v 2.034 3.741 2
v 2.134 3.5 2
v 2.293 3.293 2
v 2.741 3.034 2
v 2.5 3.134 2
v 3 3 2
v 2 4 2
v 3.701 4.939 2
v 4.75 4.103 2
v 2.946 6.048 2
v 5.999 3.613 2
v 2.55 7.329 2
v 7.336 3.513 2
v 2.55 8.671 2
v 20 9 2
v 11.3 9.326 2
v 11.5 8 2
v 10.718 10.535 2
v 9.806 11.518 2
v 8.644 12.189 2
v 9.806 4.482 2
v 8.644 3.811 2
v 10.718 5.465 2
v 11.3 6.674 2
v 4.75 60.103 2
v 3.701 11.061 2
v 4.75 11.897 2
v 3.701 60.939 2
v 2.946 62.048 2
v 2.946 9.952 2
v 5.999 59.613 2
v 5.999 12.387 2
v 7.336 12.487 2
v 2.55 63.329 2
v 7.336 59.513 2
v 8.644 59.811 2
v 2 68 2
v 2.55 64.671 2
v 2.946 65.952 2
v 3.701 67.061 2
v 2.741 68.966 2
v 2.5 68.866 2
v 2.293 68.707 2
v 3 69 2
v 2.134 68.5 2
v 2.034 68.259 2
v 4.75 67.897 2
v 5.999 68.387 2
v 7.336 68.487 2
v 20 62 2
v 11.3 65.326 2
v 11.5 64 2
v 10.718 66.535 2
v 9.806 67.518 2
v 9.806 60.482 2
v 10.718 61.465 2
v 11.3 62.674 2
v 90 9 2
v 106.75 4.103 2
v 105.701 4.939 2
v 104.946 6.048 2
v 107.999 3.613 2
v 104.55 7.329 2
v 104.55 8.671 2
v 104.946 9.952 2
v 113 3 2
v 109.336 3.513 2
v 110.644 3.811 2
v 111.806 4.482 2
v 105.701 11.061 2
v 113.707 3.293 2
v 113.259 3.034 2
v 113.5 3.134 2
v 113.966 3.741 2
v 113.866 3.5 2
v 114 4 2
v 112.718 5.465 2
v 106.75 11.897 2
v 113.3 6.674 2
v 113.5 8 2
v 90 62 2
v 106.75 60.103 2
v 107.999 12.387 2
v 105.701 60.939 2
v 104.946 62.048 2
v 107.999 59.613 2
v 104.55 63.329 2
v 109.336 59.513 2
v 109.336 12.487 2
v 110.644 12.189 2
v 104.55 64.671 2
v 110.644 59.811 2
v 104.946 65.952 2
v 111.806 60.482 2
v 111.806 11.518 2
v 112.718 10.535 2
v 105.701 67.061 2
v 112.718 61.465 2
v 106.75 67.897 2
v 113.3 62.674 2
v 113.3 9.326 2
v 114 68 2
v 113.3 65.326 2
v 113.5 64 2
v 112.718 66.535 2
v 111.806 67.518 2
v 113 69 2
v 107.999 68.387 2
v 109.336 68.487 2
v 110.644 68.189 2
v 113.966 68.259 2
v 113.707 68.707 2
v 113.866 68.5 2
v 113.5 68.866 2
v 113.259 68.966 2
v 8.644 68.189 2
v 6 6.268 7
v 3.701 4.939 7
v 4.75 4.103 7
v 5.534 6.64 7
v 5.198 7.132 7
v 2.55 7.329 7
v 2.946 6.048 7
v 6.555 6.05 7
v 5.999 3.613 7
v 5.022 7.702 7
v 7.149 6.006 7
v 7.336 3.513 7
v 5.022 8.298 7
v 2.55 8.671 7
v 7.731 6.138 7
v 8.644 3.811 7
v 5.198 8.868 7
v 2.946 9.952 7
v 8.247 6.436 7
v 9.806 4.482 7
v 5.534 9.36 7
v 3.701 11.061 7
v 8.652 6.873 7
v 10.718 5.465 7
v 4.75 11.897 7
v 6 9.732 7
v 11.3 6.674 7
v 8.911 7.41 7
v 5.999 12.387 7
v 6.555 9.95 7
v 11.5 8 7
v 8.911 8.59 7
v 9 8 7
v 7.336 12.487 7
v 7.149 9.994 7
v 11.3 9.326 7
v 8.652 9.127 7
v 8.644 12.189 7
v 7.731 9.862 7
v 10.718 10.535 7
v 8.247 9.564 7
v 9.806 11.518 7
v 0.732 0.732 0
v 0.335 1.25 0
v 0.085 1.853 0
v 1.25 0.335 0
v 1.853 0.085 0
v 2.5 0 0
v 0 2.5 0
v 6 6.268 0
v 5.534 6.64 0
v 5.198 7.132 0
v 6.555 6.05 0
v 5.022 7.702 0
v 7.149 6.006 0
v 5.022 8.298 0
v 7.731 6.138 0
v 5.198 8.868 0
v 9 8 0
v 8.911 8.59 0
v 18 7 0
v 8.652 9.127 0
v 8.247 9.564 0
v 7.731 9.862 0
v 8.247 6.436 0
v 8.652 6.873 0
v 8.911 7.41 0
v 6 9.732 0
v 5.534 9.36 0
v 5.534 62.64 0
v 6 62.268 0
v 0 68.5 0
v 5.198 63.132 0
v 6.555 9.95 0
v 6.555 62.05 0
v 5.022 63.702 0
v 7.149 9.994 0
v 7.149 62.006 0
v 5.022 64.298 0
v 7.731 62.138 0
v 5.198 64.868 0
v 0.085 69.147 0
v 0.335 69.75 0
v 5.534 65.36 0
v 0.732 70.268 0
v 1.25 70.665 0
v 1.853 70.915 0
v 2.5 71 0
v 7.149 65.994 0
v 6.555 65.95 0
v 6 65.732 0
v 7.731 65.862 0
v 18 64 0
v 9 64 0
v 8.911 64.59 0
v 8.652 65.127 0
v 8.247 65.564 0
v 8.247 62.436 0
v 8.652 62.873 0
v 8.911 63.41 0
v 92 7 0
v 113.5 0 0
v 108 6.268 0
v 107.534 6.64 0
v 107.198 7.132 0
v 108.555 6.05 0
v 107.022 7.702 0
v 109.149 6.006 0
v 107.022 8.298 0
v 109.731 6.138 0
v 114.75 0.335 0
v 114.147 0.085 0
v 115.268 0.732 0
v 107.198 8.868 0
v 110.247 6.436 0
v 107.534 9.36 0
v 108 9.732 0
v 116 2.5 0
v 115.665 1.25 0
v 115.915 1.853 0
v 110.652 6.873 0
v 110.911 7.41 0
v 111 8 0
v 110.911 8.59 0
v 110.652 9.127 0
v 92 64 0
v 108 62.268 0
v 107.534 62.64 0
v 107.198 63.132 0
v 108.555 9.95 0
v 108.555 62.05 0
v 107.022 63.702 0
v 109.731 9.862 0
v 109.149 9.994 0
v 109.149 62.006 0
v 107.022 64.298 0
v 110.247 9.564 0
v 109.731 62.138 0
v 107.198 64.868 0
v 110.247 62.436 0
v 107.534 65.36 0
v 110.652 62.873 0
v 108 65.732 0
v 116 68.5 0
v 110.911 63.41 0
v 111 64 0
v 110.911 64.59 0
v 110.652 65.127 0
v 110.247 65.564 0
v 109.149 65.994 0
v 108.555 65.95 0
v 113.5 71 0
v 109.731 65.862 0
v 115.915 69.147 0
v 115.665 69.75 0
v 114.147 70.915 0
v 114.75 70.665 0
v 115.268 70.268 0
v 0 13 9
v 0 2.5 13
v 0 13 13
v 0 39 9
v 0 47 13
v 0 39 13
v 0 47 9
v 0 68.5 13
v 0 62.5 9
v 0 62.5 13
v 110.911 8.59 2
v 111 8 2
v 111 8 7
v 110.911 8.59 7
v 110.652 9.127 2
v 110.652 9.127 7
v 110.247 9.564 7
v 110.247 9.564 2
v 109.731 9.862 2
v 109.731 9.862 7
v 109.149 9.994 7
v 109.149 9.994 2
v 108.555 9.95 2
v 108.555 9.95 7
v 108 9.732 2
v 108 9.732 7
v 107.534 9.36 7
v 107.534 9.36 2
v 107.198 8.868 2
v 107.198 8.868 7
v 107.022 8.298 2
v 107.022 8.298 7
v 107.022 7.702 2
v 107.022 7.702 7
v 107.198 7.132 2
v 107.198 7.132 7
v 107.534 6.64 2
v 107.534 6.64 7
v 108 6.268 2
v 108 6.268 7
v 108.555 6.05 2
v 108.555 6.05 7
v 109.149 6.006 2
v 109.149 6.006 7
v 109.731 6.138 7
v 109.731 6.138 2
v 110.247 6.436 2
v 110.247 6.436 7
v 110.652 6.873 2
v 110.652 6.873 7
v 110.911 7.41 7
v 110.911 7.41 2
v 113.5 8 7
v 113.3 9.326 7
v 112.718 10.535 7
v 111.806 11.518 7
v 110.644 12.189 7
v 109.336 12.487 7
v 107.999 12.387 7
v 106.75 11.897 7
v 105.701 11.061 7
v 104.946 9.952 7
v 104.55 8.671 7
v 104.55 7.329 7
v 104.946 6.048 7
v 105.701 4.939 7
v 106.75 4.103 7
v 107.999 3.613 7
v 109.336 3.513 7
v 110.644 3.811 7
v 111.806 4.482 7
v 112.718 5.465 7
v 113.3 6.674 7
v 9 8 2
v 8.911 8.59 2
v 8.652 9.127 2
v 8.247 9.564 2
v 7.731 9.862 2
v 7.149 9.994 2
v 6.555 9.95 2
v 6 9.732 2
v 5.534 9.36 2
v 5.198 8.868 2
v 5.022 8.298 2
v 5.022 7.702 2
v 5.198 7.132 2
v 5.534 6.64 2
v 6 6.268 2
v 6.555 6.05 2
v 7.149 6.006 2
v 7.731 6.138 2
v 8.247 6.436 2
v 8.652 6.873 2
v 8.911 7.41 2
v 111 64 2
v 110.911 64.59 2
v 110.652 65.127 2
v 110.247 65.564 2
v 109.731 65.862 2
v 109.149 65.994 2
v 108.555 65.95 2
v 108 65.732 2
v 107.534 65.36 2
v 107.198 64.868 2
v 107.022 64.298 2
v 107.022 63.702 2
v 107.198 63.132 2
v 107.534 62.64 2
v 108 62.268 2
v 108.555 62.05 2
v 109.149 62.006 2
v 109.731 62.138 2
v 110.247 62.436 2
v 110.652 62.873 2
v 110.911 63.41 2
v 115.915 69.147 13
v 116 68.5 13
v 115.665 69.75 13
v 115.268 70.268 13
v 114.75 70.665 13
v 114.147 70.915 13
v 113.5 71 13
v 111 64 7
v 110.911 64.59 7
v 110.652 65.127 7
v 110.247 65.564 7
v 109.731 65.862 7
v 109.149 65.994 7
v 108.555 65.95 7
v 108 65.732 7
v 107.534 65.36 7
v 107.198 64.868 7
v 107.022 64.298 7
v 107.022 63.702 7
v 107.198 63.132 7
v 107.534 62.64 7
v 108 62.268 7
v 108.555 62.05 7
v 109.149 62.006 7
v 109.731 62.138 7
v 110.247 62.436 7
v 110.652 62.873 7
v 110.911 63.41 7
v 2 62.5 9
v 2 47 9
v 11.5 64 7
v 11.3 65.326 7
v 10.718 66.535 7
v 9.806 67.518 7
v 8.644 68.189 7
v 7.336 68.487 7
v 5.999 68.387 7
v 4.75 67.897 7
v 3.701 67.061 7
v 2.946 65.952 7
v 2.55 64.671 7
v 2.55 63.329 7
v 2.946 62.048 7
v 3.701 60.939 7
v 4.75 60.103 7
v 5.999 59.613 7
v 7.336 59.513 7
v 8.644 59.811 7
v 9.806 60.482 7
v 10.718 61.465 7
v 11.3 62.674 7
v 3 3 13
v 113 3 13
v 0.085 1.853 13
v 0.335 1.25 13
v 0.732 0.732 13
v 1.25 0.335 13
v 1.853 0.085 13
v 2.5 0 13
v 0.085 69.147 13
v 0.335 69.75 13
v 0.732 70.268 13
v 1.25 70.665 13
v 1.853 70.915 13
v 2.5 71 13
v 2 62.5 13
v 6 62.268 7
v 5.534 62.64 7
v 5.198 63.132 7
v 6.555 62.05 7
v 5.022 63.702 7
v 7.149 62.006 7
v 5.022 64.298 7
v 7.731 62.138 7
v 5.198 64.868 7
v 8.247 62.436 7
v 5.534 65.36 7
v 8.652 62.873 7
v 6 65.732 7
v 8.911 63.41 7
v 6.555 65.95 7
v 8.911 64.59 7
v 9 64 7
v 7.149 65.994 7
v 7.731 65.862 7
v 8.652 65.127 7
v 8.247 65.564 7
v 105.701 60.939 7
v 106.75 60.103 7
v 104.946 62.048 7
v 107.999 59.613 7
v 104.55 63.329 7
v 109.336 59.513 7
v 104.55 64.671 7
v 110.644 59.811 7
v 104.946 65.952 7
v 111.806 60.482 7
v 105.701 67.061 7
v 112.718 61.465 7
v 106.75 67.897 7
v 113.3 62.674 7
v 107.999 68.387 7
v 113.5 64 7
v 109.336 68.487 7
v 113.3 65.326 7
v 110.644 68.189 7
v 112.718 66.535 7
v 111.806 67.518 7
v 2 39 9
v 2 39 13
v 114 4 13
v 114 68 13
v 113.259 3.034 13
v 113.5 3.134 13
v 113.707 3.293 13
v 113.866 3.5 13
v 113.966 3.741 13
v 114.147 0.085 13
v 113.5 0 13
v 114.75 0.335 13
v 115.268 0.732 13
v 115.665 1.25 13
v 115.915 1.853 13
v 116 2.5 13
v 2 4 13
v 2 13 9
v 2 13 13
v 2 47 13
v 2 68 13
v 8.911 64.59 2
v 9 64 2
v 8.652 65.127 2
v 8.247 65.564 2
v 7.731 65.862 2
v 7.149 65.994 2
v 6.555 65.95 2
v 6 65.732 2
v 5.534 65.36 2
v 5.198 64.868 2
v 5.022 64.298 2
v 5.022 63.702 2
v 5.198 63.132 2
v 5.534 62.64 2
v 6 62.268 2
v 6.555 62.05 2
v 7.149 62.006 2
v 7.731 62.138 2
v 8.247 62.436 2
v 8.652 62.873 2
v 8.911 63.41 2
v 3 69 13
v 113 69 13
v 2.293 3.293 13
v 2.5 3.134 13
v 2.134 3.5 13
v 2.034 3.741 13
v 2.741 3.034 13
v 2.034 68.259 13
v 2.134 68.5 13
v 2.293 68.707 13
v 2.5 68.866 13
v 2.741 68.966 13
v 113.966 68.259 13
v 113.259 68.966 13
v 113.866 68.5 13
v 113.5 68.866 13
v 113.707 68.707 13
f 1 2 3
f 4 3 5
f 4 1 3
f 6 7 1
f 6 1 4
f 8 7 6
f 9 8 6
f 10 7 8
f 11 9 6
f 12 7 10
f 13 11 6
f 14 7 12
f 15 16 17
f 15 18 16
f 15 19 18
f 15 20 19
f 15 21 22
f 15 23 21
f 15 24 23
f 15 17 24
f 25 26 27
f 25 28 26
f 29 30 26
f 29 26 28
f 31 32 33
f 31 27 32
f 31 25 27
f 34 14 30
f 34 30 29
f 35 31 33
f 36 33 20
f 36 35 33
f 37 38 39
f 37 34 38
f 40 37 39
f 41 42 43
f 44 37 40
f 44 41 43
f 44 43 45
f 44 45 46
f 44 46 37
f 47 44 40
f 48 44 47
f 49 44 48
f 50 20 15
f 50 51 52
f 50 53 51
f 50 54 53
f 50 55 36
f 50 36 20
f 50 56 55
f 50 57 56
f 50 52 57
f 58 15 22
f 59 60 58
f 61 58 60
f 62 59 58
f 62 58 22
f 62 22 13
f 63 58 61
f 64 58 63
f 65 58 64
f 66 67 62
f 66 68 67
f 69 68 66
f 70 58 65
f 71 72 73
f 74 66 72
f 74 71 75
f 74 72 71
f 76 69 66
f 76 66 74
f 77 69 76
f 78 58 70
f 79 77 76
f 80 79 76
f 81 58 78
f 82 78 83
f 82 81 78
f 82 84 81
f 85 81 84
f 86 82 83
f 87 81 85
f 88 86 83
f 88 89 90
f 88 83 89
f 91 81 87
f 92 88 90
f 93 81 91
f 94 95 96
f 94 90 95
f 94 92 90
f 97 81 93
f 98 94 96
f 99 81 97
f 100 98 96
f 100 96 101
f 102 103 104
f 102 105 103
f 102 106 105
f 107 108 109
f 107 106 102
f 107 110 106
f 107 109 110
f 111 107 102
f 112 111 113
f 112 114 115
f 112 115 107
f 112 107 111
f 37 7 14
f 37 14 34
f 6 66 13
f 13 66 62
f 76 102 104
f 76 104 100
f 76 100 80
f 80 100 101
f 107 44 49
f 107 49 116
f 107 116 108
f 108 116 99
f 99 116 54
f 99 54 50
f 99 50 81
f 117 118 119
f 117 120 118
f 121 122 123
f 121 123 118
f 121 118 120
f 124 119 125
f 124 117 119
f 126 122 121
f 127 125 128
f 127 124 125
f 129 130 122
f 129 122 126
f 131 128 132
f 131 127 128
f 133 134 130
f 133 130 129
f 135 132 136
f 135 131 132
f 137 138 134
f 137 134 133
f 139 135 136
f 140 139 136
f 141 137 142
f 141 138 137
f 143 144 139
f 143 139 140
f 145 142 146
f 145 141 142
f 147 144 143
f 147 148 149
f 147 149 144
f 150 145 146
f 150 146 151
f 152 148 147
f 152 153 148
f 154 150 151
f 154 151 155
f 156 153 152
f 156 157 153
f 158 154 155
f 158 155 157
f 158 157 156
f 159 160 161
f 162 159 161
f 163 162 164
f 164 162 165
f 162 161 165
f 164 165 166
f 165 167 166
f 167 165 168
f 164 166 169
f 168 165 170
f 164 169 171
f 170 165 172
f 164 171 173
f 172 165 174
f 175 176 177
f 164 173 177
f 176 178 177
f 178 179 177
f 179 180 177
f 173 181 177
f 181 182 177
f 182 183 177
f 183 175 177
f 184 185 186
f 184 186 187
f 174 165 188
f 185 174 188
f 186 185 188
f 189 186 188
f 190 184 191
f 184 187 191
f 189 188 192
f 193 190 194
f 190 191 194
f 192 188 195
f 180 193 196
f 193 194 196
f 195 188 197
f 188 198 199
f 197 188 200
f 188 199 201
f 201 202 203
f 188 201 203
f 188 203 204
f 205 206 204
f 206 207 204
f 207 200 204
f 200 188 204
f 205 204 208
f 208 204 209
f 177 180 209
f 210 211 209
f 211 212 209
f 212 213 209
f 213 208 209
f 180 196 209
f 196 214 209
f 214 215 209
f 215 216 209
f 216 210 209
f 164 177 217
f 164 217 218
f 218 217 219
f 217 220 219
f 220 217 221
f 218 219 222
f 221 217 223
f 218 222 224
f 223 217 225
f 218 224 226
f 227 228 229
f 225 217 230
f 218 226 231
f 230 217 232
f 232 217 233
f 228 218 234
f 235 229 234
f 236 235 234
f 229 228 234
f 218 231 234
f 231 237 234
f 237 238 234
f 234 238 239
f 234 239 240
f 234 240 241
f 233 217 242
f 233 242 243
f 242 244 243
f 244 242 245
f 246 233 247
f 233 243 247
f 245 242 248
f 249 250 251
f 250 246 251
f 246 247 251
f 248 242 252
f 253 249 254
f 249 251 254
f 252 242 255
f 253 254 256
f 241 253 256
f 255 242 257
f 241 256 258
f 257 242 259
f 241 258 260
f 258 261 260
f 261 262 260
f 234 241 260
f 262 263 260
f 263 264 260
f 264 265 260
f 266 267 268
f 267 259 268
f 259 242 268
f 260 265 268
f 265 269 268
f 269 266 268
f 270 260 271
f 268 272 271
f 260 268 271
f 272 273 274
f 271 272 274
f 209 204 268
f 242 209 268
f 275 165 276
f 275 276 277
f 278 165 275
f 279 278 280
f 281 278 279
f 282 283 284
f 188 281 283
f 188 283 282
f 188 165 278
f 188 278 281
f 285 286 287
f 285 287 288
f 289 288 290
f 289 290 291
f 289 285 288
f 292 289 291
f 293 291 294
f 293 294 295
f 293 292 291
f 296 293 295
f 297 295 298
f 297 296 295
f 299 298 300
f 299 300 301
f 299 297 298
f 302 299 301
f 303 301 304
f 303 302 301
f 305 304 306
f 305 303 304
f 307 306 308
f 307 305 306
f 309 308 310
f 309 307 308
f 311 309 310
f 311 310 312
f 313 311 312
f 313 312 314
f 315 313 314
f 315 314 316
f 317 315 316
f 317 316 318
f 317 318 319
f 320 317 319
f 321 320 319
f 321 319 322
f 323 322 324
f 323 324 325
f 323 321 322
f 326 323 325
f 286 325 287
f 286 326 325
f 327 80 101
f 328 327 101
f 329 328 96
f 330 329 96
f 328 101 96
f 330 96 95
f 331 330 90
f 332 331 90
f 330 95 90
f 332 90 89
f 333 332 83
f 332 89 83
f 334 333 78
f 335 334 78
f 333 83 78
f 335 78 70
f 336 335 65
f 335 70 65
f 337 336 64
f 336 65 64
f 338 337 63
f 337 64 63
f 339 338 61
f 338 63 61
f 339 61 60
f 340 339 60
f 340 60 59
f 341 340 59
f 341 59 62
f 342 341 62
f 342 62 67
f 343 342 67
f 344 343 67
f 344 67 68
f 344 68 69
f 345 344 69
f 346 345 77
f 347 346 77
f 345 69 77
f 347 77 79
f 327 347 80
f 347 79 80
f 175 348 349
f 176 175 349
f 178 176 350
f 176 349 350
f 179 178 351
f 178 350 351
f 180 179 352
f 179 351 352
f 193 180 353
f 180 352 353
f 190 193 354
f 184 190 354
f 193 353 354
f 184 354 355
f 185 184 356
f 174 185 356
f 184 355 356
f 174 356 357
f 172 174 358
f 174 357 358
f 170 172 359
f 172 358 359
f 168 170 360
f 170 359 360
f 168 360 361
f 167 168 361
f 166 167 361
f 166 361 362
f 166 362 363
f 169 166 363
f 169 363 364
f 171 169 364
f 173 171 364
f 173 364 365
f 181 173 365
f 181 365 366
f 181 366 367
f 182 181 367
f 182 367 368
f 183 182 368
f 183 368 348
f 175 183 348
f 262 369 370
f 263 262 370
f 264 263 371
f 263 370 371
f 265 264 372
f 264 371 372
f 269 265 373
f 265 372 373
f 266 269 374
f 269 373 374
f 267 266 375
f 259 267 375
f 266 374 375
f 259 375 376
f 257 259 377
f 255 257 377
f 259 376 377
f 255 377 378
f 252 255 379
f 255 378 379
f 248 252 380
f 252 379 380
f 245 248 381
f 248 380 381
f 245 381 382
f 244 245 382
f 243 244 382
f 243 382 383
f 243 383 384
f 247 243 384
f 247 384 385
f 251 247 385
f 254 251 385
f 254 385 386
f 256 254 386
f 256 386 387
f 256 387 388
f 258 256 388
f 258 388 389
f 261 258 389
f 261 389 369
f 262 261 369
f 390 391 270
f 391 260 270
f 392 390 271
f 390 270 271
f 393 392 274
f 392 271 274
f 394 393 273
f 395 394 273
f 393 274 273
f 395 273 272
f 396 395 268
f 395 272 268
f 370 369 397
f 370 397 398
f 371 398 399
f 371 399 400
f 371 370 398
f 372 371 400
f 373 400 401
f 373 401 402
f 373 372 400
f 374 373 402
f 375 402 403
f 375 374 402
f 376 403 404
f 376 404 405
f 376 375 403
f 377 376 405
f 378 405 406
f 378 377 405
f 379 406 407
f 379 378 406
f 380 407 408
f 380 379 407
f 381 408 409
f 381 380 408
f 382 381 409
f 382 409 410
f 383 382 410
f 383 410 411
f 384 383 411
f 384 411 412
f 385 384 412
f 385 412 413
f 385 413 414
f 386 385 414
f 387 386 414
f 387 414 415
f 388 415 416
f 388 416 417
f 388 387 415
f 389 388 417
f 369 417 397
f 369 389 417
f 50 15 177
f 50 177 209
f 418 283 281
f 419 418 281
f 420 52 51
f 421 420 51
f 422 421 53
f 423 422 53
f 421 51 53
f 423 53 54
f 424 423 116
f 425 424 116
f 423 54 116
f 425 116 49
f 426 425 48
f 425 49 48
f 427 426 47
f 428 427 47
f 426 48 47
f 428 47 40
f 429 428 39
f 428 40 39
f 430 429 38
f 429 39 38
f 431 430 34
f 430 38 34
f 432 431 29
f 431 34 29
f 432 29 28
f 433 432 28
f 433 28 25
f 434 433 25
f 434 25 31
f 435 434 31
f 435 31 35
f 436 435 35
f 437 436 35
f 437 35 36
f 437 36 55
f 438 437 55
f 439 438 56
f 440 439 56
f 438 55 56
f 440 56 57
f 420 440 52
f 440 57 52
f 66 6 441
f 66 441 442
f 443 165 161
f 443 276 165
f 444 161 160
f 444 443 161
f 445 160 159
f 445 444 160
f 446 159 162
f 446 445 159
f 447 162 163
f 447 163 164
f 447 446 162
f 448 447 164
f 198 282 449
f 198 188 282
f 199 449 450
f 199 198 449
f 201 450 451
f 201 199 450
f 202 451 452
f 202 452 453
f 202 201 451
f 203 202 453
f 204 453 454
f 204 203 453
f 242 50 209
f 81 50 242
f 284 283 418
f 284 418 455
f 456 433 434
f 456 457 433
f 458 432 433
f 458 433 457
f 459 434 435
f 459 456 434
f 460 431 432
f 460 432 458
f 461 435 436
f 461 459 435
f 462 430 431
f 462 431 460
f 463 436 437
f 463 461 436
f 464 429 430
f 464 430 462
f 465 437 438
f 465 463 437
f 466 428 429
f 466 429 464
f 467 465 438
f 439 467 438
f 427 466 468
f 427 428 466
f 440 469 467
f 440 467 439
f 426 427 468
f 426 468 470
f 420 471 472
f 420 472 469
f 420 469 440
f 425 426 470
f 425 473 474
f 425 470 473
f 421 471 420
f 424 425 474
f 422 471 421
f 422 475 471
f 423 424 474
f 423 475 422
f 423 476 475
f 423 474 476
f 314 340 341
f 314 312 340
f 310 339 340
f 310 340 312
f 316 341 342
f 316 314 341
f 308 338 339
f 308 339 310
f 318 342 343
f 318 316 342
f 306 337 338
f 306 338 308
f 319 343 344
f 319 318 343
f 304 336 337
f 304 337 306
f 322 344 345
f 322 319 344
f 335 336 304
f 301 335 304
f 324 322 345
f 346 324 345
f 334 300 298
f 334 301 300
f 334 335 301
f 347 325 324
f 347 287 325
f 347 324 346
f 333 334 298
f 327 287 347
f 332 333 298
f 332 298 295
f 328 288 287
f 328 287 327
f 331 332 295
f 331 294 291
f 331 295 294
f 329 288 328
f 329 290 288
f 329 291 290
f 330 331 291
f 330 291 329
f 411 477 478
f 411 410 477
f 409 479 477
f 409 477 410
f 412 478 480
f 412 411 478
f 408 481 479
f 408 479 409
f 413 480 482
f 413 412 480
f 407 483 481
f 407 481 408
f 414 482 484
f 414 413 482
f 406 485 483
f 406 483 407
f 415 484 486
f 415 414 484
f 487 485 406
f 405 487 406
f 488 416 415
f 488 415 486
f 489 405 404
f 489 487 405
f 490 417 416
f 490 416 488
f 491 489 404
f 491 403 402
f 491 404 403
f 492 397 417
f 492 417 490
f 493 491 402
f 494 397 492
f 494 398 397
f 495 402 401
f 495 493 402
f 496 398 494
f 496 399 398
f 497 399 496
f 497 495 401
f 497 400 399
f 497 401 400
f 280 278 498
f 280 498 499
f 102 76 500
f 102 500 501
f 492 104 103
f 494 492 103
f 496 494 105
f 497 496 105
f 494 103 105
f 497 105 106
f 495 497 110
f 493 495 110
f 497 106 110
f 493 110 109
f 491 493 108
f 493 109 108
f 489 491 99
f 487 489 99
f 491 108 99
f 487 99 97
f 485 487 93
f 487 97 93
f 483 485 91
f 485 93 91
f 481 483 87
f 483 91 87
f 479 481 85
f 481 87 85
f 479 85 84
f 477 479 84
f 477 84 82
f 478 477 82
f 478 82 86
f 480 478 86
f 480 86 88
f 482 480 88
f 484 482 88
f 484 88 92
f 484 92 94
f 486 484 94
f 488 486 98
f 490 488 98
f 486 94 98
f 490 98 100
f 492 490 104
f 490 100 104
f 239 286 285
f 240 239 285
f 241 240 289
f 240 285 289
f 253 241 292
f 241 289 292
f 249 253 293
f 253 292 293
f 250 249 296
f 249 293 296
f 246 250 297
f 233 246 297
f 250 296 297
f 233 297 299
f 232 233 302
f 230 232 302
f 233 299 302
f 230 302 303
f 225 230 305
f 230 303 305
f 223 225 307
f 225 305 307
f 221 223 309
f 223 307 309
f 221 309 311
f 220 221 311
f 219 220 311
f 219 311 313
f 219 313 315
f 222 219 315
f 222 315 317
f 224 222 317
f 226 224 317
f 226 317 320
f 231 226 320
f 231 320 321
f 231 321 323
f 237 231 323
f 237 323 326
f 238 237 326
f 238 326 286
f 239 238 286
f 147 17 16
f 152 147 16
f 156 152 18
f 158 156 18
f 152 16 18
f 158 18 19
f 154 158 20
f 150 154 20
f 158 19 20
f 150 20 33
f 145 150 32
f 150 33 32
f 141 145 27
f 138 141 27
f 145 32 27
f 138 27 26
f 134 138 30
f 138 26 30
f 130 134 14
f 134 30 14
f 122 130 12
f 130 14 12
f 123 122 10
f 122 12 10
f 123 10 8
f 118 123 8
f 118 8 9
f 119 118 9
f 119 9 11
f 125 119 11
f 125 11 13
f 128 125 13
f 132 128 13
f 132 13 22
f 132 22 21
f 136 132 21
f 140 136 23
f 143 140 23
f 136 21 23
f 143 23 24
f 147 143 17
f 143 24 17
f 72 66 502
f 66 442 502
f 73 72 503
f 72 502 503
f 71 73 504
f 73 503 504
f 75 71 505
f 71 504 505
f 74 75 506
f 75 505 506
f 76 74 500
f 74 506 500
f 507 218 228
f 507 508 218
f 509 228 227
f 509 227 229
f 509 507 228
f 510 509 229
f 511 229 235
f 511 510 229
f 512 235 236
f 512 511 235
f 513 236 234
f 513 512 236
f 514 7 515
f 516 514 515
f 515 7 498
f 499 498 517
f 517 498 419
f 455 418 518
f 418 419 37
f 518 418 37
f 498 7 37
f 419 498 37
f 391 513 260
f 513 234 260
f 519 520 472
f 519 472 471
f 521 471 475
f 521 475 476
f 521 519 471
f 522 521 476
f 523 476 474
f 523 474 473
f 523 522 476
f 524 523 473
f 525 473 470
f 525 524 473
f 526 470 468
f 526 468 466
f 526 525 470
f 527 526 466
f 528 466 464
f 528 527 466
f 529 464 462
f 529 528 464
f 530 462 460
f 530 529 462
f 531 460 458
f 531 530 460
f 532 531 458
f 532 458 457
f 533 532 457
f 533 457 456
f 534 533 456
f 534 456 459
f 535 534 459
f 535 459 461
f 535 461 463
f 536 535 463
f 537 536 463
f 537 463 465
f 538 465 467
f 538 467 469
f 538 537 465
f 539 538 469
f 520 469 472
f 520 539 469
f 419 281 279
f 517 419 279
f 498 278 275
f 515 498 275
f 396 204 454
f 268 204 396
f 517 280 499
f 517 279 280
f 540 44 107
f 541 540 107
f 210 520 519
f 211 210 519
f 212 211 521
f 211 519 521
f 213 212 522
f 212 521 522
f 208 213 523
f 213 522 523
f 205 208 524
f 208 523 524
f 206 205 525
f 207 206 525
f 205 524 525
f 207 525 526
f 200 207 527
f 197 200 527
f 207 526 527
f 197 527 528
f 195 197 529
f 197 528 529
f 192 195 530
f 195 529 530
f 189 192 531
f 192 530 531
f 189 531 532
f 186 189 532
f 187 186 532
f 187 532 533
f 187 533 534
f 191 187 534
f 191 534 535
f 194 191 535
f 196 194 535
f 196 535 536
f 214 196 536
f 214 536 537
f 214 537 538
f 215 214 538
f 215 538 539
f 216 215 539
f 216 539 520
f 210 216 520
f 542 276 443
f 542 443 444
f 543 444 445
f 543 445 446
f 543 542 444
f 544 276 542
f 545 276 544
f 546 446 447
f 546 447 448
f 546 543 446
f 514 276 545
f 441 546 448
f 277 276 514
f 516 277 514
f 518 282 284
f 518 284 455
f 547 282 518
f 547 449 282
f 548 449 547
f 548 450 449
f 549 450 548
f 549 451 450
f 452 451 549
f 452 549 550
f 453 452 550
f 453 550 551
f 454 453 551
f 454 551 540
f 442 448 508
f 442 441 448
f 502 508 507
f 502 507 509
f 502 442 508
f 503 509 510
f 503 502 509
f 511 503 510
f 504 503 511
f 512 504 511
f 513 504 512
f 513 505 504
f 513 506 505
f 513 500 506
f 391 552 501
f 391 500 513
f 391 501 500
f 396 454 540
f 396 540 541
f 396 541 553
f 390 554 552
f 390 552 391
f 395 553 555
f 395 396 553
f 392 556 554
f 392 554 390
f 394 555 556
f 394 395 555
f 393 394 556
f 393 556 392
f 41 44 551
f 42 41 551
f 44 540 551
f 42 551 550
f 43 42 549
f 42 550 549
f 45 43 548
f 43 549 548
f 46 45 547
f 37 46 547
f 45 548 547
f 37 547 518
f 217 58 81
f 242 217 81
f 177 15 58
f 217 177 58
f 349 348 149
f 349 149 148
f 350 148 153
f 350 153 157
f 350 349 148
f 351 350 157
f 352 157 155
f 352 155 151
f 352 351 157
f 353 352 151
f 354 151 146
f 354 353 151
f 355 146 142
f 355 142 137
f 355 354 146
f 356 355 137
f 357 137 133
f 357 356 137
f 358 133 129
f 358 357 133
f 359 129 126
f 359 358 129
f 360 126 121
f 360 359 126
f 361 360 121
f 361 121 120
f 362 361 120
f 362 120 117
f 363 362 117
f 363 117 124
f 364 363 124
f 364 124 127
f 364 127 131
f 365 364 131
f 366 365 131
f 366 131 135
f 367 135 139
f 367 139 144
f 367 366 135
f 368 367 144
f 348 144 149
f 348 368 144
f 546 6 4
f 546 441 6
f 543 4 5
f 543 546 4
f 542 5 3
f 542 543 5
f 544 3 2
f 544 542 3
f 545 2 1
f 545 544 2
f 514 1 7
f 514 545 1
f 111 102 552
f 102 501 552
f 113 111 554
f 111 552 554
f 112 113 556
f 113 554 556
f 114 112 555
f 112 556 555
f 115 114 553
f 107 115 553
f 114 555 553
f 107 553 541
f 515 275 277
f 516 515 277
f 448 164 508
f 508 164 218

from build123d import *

# Parameters (mm, degrees)
F0_W      = 116
F0_H      = 71
F0_W_2    = 70
F0_H_2    = 53
F1_DEPTH  = 2
F2_W      = 116
F2_H      = 71
F2_W_2    = 112
F2_H_2    = 66
F3_DEPTH  = 11
F4_R      = 2.5
F5_R      = 1
F6_R      = 4.5
F6_R_2    = 2
F7_DEPTH  = 5
F8_SIZE   = 1.99999
F9_W      = 15.5
F9_H      = 7.5
F9_W_2    = 26
F9_H_2    = 4
F10_DEPTH = 25
F11_DEPTH = 25


# Not quite as in the source:
# - a fillet or chamfer is up to 0.001 mm smaller than in the source, because OpenCascade refuses the exact size


with BuildPart() as f1:
    # F0 (on Top) → F1 (new body)
    with BuildSketch(Plane.XY):
        with Locations((58, 35.5)):
            Rectangle(F0_W, F0_H)
        with Locations((55, 35.5)):
            Rectangle(F0_W_2, F0_H_2, mode=Mode.SUBTRACT)
    extrude(amount=F1_DEPTH)

    # F2 (on face) → F3 (join)
    with BuildSketch(Plane.XY.offset(2)):
        with Locations((58, 35.5)):
            Rectangle(F2_W, F2_H)
        with Locations((58, 36)):
            Rectangle(F2_W_2, F2_H_2, mode=Mode.SUBTRACT)
    extrude(amount=F3_DEPTH)

    # F4
    f4_edges = [f1.edges().sort_by_distance(p)[0] for p in [
        (0, 0, 6.5),
        (116, 0, 6.5),
        (0, 71, 6.5),
        (116, 71, 6.5),
    ]]
    fillet(f4_edges, radius=F4_R)

    # F5
    f5_edges = [f1.edges().sort_by_distance(p)[0] for p in [
        (114, 3, 7.5),
        (2, 3, 7.5),
        (2, 69, 7.5),
        (114, 69, 7.5),
    ]]
    fillet(f5_edges, radius=F5_R)

    # F6 (on face) → F7 (join)
    with BuildSketch(Plane.XY.offset(2)):
        with Locations((7, 64)):
            Circle(F6_R)
        with Locations((7, 64)):
            Circle(F6_R_2, mode=Mode.SUBTRACT)
        with Locations((7, 8)):
            Circle(F6_R)
        with Locations((7, 8)):
            Circle(F6_R_2, mode=Mode.SUBTRACT)
        with Locations((109, 8)):
            Circle(F6_R)
        with Locations((109, 8)):
            Circle(F6_R_2, mode=Mode.SUBTRACT)
        with Locations((109, 64)):
            Circle(F6_R)
        with Locations((109, 64)):
            Circle(F6_R_2, mode=Mode.SUBTRACT)
    extrude(amount=F7_DEPTH)

    # F8 (size 2 in the source; OpenCascade refuses exactly that, so slightly less here)
    f8_edges = [f1.edges().sort_by_distance(p)[0] for p in [
        (90, 35.5, 0),
        (55, 9, 0),
        (20, 35.5, 0),
        (55, 62, 0),
    ]]
    chamfer(f8_edges, length=F8_SIZE)

    # F9 (on face) → F10 (cut)
    with BuildSketch(Plane(origin=(0, 0, 0), x_dir=(0, -1, 0), z_dir=(-1, 0, 0))):
        with Locations((-54.75, 12.75)):
            Rectangle(F9_W, F9_H)
        with Locations((-26, 11)):
            Rectangle(F9_W_2, F9_H_2)
    extrude(amount=-F10_DEPTH, mode=Mode.SUBTRACT)

    # F11 (cut): faces of the model
    f11_faces = [f1.faces().sort_by_distance(p)[0] for p in [
        (7, 8, 2),
        (7, 64, 2),
        (109, 8, 2),
        (109, 64, 2),
    ]]
    extrude(f11_faces, amount=-F11_DEPTH, mode=Mode.SUBTRACT)


solid = f1.part
